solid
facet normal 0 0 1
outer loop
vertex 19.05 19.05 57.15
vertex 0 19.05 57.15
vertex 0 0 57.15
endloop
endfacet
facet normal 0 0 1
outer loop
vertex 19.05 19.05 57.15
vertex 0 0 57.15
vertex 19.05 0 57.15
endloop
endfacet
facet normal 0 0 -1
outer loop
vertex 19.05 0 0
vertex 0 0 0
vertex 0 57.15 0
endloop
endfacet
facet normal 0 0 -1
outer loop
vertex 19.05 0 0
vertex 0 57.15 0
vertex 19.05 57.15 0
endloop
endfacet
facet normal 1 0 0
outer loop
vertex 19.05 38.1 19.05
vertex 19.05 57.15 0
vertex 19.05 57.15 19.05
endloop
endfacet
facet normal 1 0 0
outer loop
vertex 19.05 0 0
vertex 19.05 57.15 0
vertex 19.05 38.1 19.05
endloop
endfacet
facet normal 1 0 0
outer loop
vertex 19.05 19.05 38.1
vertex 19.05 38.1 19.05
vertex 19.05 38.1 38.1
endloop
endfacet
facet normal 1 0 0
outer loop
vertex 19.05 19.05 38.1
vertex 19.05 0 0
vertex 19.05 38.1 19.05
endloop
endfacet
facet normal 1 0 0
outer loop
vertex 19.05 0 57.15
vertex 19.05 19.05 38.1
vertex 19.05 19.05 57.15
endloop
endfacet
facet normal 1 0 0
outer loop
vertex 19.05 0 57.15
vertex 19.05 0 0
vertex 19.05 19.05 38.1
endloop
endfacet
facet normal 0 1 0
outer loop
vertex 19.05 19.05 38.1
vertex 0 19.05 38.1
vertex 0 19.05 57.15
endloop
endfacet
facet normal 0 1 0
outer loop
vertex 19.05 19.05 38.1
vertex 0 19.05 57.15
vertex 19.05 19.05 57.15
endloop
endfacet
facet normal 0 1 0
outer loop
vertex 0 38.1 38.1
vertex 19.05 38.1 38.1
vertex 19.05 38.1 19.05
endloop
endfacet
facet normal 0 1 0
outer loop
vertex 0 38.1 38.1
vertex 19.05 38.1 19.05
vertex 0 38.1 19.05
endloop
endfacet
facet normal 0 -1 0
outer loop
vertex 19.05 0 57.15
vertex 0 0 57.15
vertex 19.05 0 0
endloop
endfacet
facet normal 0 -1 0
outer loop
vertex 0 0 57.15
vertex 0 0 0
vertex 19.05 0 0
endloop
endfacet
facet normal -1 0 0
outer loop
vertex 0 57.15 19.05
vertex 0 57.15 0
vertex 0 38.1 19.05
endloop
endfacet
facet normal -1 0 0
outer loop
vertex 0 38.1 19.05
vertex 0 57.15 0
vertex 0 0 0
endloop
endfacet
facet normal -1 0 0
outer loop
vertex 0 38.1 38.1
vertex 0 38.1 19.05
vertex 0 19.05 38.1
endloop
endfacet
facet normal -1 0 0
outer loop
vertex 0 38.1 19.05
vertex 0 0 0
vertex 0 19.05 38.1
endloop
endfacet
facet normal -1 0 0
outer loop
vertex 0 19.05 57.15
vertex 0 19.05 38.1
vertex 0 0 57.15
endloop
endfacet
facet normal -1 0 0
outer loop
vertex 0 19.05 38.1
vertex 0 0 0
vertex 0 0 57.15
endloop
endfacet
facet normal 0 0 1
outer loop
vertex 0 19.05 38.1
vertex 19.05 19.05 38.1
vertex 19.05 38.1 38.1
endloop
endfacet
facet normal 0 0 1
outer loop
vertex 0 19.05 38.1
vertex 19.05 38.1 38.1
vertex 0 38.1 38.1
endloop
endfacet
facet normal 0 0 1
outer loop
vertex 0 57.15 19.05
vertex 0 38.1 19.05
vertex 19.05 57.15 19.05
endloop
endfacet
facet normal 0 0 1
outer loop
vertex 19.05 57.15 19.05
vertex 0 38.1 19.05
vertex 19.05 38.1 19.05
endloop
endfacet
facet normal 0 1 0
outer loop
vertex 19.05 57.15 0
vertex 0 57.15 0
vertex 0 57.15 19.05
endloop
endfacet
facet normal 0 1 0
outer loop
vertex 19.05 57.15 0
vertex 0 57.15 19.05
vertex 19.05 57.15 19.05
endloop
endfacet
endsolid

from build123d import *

# Parameters (mm, degrees)
F0_W     = 19.05
F0_H     = 19.05
F1_DEPTH = 19.05
F2_DEPTH = 19.05
F4_DEPTH = 19.05
F3_W     = 19.05
F3_H     = 19.05
F5_DEPTH = 19.05
F6_DEPTH = 19.05
F7_W     = 19.05
F7_H     = 19.05
F8_DEPTH = 19.05


with BuildPart() as f1:
    # F0 (on Top) → F1 (new body)
    with BuildSketch(Plane.XY):
        with Locations((9.525, 9.525)):
            Rectangle(F0_W, F0_H)
    extrude(amount=F1_DEPTH)

    # F2 (add): a face of the model
    f2_faces = [f1.faces().sort_by_distance(p)[0] for p in [
        (9.525, 19.05, 9.525),
    ]]
    extrude(f2_faces, amount=F2_DEPTH)

    # F4 (add): a face of the model
    f4_faces = [f1.faces().sort_by_distance(p)[0] for p in [
        (9.525, 38.1, 9.525),
    ]]
    extrude(f4_faces, amount=F4_DEPTH)

    # F3 (on face) → F5 (join)
    with BuildSketch(Plane.XY.offset(19.05)):
        with Locations((9.525, 9.525)):
            Rectangle(F3_W, F3_H)
    extrude(amount=F5_DEPTH)

    # F6 (add): a face of the model
    f6_faces = [f1.faces().sort_by_distance(p)[0] for p in [
        (9.525, 9.525, 38.1),
    ]]
    extrude(f6_faces, amount=F6_DEPTH)

    # F7 (on face) → F8 (join)
    with BuildSketch(Plane(origin=(0, 19.05, 0), x_dir=(-1, 0, 0), z_dir=(0, 1, 0))):
        with Locations((-9.525, 28.575)):
            Rectangle(F7_W, F7_H)
    extrude(amount=F8_DEPTH)


solid = f1.part
